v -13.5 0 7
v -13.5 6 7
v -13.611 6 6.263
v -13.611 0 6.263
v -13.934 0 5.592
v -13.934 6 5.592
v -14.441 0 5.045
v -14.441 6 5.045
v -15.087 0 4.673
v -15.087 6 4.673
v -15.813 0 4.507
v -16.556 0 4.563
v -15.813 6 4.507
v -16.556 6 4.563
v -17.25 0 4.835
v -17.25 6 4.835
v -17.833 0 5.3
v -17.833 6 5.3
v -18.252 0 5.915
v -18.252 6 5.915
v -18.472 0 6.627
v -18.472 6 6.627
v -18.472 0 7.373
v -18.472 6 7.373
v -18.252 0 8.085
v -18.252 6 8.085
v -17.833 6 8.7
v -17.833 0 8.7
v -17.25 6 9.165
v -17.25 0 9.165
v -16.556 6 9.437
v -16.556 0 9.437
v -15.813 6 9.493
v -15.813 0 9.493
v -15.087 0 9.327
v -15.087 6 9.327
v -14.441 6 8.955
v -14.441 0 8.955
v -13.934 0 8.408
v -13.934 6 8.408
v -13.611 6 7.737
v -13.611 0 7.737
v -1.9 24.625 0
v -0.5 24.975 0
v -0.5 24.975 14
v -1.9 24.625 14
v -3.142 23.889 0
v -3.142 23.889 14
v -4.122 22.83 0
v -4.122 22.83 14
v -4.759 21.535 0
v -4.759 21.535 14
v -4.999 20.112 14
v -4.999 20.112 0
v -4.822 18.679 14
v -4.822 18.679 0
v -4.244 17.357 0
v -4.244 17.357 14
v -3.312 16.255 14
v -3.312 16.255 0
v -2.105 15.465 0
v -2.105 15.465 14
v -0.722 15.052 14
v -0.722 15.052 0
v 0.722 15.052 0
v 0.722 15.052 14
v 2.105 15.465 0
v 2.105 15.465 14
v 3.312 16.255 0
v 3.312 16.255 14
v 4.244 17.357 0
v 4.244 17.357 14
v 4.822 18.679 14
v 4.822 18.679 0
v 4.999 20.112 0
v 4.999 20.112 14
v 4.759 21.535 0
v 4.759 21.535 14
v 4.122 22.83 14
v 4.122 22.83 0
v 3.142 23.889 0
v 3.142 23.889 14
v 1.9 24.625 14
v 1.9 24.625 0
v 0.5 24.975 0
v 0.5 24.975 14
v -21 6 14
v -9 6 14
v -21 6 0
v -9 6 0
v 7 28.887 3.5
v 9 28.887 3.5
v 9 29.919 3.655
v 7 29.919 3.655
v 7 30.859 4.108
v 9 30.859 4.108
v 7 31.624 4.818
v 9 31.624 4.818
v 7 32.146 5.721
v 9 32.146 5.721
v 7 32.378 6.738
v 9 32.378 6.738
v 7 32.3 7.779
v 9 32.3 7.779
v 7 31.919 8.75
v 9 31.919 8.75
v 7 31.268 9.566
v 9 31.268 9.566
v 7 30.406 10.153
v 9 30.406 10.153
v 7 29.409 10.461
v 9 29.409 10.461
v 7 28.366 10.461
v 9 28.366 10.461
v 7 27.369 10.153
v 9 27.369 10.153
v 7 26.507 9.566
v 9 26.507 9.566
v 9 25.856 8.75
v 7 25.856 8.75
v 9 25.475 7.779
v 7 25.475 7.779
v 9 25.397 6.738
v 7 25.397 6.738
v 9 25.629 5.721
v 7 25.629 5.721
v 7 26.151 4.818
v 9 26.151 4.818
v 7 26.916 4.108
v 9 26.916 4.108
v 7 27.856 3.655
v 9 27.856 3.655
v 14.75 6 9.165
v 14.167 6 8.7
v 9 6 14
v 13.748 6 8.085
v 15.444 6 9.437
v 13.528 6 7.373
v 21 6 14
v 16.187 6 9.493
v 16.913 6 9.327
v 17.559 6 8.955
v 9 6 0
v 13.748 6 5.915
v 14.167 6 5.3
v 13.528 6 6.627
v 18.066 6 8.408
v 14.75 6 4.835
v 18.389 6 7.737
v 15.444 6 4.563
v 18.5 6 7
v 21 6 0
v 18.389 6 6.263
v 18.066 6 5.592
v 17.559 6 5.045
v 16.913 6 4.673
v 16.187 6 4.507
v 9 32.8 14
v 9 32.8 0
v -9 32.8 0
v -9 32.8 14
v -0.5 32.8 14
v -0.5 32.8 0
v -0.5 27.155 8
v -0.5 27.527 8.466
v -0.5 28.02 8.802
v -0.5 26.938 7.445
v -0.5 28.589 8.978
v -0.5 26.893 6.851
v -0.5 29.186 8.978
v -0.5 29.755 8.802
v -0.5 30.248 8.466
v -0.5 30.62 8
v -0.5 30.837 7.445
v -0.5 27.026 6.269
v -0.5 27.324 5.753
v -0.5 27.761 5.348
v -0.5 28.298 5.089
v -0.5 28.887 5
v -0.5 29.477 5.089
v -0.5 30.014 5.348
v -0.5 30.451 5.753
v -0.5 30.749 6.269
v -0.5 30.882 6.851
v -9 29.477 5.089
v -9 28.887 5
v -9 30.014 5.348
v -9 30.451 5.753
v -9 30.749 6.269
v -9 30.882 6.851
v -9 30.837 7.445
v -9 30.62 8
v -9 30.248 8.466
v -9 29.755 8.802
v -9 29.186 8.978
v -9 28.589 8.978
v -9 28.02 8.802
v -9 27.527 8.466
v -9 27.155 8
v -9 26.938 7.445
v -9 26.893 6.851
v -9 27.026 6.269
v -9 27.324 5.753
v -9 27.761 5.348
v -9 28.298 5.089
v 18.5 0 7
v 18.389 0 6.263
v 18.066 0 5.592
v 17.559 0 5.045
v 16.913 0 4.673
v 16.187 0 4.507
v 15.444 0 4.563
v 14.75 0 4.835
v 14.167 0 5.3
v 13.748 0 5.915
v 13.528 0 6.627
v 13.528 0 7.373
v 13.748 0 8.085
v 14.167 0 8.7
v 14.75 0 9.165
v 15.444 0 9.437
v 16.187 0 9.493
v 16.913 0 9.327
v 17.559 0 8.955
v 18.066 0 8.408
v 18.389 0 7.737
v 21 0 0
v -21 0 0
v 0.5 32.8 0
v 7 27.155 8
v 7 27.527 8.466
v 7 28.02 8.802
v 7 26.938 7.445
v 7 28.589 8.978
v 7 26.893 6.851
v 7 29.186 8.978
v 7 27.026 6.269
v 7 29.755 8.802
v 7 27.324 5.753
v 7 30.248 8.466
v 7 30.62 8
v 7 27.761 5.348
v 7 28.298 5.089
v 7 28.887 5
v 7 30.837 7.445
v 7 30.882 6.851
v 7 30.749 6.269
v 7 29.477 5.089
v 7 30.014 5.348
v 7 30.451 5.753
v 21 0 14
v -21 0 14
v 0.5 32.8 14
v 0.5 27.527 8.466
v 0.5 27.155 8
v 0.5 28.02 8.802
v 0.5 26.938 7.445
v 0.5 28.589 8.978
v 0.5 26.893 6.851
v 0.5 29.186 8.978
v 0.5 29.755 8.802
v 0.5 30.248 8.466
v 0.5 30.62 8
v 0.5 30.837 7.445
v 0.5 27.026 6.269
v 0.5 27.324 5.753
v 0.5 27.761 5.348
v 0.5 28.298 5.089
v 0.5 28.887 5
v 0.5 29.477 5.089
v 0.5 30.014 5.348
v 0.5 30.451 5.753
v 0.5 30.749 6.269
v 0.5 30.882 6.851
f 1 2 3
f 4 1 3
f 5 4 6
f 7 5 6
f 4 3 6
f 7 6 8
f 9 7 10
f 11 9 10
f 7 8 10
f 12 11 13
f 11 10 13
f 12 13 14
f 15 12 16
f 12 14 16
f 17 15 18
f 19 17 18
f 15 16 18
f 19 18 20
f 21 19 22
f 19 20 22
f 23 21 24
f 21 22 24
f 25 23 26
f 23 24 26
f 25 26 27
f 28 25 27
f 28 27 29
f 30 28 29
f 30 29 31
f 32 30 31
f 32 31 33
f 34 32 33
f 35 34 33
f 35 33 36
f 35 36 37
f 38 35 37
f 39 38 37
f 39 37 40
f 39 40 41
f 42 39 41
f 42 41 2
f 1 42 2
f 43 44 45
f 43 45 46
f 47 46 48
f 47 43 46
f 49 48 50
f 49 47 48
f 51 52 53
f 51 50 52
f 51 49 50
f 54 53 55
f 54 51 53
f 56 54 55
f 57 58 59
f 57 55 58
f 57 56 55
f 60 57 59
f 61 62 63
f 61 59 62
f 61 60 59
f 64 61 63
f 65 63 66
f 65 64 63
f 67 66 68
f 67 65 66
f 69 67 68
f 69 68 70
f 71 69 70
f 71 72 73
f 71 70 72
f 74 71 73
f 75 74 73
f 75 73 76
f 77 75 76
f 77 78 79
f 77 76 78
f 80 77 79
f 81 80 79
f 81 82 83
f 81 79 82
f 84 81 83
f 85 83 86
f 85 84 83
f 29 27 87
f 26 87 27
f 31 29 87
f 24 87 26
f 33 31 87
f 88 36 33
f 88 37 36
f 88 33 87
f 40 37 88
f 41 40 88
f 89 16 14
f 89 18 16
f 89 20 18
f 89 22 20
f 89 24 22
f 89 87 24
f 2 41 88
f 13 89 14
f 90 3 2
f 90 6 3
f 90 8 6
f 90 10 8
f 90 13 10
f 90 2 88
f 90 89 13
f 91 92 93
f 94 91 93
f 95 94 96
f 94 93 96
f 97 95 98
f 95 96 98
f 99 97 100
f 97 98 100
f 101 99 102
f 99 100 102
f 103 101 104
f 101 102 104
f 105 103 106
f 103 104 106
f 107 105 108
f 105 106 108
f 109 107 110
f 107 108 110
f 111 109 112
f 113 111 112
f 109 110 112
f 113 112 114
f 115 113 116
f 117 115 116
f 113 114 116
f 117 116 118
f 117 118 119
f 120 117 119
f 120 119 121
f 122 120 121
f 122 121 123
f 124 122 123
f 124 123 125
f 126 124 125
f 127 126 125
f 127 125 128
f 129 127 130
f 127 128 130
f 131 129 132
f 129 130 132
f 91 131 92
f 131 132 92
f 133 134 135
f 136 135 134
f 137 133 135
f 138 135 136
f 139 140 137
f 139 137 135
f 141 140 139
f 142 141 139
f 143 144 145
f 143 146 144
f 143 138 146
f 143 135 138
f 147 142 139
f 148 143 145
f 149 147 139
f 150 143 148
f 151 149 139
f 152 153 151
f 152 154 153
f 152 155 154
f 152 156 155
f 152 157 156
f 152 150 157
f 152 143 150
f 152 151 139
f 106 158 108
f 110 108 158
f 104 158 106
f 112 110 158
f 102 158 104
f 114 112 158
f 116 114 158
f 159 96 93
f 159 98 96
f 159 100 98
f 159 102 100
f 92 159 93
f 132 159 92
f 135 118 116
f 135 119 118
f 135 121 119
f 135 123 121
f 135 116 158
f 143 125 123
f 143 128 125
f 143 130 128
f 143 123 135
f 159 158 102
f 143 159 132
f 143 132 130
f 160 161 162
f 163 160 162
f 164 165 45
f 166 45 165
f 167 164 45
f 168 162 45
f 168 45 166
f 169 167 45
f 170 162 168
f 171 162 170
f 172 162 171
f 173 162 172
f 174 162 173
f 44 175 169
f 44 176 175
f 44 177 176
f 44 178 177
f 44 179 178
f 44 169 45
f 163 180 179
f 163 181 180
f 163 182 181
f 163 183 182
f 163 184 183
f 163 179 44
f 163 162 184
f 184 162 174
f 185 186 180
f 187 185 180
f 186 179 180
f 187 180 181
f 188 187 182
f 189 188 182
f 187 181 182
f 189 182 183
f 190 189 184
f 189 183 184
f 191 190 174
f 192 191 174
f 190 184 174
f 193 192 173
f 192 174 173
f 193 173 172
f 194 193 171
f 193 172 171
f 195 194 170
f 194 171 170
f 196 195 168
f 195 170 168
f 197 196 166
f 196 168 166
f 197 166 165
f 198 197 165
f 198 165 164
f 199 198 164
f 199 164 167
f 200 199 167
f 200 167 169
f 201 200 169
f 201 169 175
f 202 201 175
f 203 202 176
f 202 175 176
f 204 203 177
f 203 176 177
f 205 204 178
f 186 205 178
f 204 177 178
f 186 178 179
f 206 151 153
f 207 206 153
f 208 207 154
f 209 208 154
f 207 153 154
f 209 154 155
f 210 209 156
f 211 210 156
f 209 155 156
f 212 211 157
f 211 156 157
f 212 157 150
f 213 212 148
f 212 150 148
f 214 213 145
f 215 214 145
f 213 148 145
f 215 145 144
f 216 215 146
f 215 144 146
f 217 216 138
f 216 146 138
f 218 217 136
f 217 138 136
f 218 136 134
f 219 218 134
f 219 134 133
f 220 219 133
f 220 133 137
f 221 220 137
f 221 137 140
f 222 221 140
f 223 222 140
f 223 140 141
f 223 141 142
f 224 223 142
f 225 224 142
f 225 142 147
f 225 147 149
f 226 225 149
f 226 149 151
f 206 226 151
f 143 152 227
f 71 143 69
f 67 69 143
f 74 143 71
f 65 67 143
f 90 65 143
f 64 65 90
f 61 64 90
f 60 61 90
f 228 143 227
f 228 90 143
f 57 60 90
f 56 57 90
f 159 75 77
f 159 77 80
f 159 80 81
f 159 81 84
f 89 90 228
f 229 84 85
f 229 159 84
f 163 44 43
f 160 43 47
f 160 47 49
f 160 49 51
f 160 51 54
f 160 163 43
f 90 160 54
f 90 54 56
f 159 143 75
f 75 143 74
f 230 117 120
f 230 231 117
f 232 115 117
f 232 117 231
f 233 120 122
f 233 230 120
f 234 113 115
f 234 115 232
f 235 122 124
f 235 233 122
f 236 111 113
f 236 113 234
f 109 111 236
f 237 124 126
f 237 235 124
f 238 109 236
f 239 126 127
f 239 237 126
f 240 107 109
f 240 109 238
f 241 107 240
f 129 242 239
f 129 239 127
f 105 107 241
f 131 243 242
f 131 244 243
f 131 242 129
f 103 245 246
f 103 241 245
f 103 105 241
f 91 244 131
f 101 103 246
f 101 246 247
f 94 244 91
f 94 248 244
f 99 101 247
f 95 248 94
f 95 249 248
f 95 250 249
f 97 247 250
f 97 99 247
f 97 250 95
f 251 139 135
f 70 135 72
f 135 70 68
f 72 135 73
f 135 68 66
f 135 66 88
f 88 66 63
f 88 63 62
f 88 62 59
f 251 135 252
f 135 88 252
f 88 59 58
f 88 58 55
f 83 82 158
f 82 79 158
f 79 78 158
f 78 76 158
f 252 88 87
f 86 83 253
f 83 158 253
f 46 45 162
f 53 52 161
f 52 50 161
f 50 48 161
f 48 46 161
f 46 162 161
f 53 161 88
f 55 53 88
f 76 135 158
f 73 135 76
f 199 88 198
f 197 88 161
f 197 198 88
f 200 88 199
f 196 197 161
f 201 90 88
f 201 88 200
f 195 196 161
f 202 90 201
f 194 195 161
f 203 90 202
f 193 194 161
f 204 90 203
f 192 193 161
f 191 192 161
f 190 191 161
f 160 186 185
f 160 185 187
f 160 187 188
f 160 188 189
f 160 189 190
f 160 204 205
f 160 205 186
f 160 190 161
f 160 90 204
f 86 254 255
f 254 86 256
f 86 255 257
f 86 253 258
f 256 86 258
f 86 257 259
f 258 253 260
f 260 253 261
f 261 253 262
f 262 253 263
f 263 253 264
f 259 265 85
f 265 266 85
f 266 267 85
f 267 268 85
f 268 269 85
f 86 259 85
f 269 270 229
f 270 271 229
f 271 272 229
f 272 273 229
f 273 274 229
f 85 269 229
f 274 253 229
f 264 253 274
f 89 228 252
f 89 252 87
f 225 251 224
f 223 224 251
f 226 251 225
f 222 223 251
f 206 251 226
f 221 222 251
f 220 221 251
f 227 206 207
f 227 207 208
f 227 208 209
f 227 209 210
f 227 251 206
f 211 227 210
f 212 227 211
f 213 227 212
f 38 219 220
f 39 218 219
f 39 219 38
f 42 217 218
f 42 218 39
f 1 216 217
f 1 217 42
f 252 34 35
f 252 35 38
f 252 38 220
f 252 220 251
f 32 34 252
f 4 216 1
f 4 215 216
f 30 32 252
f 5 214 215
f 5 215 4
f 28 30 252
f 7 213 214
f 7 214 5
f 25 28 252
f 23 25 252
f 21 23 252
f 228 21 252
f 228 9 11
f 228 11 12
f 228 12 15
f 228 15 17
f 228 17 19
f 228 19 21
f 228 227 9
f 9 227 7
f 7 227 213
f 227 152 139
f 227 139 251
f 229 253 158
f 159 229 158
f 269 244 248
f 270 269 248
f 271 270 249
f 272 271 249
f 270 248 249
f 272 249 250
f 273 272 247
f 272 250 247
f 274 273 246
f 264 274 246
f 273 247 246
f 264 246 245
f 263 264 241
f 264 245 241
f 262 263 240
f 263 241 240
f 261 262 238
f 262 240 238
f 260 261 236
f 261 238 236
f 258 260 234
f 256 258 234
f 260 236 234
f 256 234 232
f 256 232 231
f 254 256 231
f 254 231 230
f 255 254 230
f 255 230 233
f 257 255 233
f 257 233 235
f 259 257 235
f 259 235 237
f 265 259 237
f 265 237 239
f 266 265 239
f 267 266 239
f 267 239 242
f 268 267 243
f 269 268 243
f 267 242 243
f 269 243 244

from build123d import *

# Parameters (mm, degrees)
SKETCH_1_R          = 5
EXTRUDE_1_DEPTH     = 14
SKETCH_2_R          = 2.5
CUT_EXTRUDE_1_DEPTH = 7
SKETCH_3_W          = 1
SKETCH_3_H          = 14
CUT_EXTRUDE_2_DEPTH = 14
SKETCH_4_R          = 2
CUT_EXTRUDE_3_DEPTH = 10
SKETCH_5_R          = 3.5
CUT_EXTRUDE_4_DEPTH = 2


with BuildPart() as part:
    # 草图1 → 凸台-拉伸1 (new body)
    with BuildSketch(Plane.XY):
        Polygon((21, 0), (-21, 0), (-21, 6), (-9, 6), (-9, 32.8), (9, 32.8), (9, 6), (21, 6), align=None)
        with Locations((0, 20)):
            Circle(SKETCH_1_R, mode=Mode.SUBTRACT)
    extrude(amount=EXTRUDE_1_DEPTH)

    # 草图2 → 切除-拉伸1 (cut, through all)
    with BuildSketch(Plane(origin=(0, 6, 0), x_dir=(1, 0, 0), z_dir=(0, 1, 0))):
        with Locations((-16, -7)):
            Circle(SKETCH_2_R)
        with Locations((16, -7)):
            Circle(SKETCH_2_R)
    extrude(amount=-CUT_EXTRUDE_1_DEPTH, mode=Mode.SUBTRACT)

    # 草图3 → 切除-拉伸2 (cut)
    with BuildSketch(Plane(origin=(0, 32.8, 0), x_dir=(1, 0, 0), z_dir=(0, 1, 0))):
        with Locations((0, -7)):
            Rectangle(SKETCH_3_W, SKETCH_3_H)
    extrude(amount=-CUT_EXTRUDE_2_DEPTH, mode=Mode.SUBTRACT)

    # 草图4 → 切除-拉伸3 (cut, symmetric)
    with BuildSketch(Plane(origin=(-0.5, 0, 0), x_dir=(0, 0, -1), z_dir=(1, 0, 0))):
        with Locations((-7, 28.887468593)):
            Circle(SKETCH_4_R)
    extrude(amount=CUT_EXTRUDE_3_DEPTH, both=True, mode=Mode.SUBTRACT)

    # 草图5 → 切除-拉伸4 (cut)
    with BuildSketch(Plane(origin=(9, 0, 0), x_dir=(0, 0, -1), z_dir=(1, 0, 0))):
        with Locations((-7, 28.887468593)):
            Circle(SKETCH_5_R)
    extrude(amount=-CUT_EXTRUDE_4_DEPTH, mode=Mode.SUBTRACT)


solid = part.part
